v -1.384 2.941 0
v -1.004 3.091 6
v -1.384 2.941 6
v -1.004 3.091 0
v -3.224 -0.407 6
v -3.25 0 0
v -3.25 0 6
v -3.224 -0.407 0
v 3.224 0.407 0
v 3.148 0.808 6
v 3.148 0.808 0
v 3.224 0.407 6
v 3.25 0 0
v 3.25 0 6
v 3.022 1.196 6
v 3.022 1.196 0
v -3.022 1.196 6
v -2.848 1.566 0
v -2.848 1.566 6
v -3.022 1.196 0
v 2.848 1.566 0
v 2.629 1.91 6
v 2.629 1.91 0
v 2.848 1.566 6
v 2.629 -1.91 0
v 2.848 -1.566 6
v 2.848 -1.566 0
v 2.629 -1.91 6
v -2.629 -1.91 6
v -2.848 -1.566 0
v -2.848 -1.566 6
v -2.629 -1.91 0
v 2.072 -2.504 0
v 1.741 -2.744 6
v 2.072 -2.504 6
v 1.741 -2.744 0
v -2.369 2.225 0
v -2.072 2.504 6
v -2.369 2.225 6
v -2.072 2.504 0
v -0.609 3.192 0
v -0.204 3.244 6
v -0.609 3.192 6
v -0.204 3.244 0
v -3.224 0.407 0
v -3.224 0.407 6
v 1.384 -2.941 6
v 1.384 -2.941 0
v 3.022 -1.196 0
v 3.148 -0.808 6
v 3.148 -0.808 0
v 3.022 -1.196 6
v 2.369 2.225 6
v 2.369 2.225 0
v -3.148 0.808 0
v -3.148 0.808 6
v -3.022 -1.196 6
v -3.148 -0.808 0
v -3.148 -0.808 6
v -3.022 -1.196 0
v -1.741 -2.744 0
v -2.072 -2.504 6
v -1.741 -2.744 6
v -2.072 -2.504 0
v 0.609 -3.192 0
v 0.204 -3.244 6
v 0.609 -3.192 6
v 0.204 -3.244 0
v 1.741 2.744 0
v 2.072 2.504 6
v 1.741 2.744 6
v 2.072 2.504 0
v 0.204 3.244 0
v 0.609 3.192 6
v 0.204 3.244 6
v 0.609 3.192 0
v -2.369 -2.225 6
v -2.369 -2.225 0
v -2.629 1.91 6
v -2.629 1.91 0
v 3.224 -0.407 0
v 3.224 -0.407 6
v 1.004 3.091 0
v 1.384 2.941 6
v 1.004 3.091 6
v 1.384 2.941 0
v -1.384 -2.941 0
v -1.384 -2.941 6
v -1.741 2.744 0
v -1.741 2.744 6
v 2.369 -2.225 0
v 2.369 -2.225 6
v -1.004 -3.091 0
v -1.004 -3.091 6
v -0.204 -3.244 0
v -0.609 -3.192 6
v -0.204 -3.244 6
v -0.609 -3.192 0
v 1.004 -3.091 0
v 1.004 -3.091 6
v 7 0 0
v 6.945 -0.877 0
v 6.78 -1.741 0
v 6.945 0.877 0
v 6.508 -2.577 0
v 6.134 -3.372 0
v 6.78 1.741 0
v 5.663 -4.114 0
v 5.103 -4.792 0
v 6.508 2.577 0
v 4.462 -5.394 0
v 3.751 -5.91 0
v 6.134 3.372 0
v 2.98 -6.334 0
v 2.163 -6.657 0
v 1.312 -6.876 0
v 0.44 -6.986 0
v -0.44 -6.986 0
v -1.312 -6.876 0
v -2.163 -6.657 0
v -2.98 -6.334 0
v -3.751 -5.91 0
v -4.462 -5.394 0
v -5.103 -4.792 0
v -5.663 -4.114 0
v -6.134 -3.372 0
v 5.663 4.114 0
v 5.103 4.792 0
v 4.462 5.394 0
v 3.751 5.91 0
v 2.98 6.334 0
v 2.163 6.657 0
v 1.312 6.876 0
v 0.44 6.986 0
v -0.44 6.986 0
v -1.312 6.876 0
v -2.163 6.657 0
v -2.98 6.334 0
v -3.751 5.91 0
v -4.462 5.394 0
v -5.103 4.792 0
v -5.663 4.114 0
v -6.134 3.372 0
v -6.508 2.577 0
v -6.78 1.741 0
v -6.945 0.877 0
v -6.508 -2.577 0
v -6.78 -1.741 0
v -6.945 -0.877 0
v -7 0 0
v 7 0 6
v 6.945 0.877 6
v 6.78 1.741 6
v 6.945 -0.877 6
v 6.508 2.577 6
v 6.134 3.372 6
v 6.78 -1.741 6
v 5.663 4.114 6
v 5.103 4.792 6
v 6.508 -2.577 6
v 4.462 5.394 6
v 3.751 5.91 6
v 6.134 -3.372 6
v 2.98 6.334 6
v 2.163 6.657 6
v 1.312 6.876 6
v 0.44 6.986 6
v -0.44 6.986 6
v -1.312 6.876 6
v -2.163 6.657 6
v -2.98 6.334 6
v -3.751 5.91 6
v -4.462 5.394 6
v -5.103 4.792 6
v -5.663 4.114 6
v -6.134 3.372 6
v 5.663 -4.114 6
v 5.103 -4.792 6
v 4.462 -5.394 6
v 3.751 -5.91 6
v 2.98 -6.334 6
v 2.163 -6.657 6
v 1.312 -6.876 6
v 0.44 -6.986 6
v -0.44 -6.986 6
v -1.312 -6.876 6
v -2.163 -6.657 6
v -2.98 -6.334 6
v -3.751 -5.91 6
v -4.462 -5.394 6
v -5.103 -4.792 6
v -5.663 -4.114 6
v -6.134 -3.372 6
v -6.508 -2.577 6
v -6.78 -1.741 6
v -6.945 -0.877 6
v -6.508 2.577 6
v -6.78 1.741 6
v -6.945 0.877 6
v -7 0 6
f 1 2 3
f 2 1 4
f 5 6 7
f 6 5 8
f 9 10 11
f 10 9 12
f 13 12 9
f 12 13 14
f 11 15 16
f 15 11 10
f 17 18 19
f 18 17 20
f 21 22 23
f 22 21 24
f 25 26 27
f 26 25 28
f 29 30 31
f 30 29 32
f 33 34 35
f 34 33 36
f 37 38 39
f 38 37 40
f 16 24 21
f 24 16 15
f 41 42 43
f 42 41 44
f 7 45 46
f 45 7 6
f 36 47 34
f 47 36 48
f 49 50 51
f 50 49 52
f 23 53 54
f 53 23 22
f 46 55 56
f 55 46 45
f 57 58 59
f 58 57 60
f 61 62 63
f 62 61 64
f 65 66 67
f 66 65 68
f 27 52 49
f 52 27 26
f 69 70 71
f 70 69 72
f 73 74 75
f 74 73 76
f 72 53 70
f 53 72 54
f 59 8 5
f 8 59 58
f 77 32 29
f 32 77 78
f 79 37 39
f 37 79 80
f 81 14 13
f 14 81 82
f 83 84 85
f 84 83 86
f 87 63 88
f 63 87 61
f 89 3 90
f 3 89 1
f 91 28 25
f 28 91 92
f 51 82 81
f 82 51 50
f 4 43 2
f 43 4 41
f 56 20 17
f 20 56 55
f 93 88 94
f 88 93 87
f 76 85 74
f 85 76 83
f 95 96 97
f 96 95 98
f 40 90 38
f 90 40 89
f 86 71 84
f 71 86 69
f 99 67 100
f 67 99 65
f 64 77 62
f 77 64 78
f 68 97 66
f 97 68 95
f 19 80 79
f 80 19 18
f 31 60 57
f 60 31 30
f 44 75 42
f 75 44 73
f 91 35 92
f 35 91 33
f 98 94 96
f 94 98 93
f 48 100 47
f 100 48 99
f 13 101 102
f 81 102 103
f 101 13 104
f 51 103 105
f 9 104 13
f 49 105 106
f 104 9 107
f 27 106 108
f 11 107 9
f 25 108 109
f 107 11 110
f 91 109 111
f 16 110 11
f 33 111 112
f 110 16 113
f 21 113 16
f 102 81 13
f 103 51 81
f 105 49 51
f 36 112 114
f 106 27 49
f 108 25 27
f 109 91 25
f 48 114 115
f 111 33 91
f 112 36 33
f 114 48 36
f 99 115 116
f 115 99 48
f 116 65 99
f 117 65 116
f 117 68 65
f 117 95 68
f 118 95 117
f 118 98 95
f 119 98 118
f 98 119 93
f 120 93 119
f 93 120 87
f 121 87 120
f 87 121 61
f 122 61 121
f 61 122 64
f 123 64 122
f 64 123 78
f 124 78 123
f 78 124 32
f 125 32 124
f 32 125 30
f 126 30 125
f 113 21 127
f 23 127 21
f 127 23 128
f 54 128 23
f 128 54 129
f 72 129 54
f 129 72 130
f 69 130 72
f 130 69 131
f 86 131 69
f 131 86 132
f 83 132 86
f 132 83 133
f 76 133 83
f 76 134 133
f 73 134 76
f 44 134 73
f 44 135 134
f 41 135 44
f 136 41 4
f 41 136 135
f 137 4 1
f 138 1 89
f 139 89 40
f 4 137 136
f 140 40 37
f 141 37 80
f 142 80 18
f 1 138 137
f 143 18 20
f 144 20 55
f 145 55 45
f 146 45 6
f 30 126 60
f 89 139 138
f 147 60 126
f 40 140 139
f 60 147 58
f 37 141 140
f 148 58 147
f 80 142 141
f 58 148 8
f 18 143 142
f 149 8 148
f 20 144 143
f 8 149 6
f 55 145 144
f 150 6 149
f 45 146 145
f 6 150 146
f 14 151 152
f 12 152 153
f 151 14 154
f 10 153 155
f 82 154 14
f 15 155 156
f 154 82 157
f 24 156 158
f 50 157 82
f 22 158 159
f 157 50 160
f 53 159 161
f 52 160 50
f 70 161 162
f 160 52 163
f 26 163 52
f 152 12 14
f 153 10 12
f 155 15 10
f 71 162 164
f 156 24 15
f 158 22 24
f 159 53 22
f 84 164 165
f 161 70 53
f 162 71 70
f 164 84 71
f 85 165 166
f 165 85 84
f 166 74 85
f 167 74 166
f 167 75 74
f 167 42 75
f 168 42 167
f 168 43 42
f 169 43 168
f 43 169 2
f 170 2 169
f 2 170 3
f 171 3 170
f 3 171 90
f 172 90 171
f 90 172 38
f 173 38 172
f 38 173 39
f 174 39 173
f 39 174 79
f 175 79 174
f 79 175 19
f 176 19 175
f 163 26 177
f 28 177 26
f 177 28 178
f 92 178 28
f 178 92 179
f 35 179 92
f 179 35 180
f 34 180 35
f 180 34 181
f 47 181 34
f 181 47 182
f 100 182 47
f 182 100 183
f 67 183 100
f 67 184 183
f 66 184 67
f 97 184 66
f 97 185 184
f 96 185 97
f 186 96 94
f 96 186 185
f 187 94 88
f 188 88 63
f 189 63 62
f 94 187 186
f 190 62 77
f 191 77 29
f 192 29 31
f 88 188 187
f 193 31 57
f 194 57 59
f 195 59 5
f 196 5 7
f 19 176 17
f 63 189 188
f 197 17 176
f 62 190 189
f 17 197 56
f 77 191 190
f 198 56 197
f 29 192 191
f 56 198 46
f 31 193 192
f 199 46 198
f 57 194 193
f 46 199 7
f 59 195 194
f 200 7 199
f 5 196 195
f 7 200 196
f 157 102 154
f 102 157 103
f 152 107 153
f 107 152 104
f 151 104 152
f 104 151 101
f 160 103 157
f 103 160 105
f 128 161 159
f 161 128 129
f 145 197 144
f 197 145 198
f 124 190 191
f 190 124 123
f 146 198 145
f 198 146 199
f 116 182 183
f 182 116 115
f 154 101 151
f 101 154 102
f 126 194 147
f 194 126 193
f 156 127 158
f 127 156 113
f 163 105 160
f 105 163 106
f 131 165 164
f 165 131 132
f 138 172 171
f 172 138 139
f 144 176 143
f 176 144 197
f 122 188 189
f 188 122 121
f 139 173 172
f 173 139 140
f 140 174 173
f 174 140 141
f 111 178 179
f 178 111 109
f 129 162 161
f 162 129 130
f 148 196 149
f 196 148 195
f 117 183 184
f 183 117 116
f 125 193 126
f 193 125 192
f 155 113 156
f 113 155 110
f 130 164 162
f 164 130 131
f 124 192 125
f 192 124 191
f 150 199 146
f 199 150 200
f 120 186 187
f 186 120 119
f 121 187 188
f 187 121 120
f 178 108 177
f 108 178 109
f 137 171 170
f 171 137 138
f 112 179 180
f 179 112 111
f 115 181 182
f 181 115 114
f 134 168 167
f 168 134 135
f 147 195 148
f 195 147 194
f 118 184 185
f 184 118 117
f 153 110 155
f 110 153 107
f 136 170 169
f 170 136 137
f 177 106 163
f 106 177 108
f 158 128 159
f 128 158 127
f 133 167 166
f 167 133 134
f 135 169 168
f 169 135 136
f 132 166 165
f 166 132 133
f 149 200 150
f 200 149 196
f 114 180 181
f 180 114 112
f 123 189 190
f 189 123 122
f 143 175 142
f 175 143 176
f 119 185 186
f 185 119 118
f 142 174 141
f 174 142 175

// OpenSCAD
$fn = 50;

difference() {
	union() {
		cylinder(h = 6, r = 7.0);
	}
	union() {
		cylinder(h = 6, r = 3.25);
		cylinder(h = 6, r = 1.8);
	}
}
